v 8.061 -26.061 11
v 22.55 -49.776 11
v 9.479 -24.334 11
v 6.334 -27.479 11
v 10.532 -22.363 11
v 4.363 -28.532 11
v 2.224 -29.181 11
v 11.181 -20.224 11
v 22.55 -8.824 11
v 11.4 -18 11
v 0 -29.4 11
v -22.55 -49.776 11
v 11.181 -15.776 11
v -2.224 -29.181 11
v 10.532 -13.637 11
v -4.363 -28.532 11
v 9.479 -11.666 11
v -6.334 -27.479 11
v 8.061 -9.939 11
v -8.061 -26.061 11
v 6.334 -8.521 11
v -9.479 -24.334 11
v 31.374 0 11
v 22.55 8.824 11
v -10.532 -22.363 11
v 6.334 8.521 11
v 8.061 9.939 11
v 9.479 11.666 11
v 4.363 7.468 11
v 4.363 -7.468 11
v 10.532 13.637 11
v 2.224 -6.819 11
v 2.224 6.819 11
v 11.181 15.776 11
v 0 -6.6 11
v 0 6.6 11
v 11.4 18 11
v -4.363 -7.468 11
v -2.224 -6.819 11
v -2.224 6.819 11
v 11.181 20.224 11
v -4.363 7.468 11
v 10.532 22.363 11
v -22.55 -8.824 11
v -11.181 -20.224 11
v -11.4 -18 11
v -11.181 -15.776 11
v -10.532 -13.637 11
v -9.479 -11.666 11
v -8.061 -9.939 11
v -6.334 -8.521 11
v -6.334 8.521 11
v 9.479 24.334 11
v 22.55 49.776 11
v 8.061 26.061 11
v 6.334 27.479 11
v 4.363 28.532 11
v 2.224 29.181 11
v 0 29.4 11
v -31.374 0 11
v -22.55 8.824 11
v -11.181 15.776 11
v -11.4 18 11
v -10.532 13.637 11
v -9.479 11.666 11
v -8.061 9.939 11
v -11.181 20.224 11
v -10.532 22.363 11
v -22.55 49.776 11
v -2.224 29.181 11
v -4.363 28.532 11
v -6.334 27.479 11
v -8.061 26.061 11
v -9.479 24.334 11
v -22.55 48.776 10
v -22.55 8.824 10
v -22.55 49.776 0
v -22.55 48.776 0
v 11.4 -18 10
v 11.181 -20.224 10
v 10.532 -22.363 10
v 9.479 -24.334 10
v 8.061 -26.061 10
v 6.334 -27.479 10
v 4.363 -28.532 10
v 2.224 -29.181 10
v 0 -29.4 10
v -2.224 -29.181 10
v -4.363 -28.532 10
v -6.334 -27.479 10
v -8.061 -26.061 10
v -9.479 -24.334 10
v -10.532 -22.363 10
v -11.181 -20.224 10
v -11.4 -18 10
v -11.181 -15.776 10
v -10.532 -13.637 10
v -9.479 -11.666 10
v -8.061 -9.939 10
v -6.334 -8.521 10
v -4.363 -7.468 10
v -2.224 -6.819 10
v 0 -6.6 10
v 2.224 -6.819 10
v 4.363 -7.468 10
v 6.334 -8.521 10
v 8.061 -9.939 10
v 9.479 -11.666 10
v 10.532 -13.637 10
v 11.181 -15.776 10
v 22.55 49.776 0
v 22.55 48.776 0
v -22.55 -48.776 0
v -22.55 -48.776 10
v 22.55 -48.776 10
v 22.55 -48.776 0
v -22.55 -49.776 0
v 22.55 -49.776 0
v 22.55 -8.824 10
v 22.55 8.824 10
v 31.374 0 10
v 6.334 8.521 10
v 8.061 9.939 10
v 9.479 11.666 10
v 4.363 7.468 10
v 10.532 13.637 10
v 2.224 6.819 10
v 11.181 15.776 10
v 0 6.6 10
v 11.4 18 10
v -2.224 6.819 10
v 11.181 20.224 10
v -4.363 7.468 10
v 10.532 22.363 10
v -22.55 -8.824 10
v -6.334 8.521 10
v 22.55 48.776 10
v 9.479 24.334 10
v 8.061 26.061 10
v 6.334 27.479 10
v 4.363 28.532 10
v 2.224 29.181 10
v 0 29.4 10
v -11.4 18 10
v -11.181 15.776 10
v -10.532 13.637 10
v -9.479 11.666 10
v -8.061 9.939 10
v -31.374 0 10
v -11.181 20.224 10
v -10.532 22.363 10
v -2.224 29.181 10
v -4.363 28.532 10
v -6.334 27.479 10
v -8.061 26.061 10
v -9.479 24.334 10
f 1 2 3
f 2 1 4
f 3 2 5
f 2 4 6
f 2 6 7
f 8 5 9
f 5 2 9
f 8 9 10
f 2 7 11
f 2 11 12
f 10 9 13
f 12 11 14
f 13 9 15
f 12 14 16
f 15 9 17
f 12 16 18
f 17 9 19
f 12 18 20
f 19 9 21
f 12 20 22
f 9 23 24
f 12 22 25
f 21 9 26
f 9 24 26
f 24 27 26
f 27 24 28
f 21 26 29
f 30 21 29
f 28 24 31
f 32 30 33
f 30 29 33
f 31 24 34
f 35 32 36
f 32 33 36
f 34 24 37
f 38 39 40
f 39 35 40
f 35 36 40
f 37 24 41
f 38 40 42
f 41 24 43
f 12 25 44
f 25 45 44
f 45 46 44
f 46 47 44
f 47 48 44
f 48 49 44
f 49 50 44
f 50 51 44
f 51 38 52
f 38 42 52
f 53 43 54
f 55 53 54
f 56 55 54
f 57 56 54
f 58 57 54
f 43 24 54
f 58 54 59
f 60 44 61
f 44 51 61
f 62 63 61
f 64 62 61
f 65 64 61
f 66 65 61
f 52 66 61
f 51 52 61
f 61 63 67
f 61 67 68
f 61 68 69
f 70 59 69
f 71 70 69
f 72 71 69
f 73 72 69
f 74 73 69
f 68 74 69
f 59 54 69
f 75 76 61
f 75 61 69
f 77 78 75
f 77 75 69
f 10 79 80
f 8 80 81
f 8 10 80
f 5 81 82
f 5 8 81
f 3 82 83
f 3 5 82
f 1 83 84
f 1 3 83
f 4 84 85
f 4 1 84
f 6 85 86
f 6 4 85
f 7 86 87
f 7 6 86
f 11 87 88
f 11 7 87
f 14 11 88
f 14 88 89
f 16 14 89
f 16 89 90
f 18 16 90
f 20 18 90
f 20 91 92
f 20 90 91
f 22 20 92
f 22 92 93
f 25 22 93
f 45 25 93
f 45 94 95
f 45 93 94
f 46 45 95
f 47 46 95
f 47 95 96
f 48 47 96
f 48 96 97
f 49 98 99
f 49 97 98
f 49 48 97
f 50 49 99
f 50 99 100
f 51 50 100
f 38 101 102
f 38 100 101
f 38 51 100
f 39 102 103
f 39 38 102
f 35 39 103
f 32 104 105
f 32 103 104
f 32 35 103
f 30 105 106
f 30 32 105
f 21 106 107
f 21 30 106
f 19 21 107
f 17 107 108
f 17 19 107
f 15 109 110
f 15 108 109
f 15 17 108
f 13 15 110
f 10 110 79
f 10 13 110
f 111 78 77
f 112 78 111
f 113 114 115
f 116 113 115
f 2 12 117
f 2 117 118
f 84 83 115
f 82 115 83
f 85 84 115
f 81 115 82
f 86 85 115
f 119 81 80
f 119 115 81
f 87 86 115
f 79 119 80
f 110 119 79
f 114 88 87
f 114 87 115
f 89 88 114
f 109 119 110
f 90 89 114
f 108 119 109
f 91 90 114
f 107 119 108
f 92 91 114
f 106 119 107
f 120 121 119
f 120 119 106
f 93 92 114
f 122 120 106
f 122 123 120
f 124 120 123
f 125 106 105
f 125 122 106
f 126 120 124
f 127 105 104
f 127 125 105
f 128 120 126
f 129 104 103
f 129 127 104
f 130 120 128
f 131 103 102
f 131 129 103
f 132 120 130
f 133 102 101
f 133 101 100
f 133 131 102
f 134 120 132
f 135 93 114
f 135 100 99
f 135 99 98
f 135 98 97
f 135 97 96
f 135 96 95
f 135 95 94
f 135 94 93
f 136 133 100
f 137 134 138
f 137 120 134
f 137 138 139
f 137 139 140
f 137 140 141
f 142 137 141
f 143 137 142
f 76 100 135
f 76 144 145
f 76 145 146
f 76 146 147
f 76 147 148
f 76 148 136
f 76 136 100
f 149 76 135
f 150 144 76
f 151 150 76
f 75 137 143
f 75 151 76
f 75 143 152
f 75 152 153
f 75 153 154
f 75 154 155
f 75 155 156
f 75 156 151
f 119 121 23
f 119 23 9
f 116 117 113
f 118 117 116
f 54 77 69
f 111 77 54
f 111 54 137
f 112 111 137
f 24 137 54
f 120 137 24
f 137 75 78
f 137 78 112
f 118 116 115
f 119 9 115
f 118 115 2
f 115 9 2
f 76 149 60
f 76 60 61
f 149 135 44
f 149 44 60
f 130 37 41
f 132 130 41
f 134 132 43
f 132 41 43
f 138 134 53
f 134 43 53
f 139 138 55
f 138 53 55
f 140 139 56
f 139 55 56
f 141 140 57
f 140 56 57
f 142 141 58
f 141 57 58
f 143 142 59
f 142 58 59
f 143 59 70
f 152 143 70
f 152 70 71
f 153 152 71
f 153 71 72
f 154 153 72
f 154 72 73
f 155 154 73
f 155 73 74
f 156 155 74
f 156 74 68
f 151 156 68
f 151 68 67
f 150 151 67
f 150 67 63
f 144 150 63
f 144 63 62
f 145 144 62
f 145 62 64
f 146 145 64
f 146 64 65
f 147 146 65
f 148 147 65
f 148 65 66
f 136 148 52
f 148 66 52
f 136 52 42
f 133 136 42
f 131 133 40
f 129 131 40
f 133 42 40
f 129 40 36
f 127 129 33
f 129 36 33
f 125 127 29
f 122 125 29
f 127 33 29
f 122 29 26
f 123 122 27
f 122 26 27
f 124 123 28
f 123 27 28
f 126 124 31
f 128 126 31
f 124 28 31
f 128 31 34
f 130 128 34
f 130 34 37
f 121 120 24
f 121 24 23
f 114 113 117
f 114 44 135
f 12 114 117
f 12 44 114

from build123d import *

# Parameters (mm, degrees)
PAD014_DEPTH    = 1
SKETCH020_W     = 45.1
SKETCH020_H     = 1
PAD015_DEPTH    = 10
SKETCH021_R     = 11.4
POCKET005_DEPTH = 5


with BuildPart() as part:
    # Sketch019 → Pad014 (new body)
    with BuildSketch(Plane.XY):
        Polygon((-22.55, 49.776346), (22.55, 49.776346), (22.55, 8.823654), (31.373654, 0), (22.55, -8.823654), (22.55, -49.776346), (-22.55, -49.776346), (-22.55, -8.823654), (-31.373654, 0), (-22.55, 8.823654), align=None)
    extrude(amount=PAD014_DEPTH)

    # Sketch020 (on Face11 of Pad014) → Pad015 (join)
    with BuildSketch(Plane(origin=(0, 0, 0), x_dir=(1, 0, 0), z_dir=(0, 0, -1))):
        with Locations((0, 49.276346)):
            Rectangle(SKETCH020_W, SKETCH020_H)
        with Locations((0, -49.276346)):
            Rectangle(SKETCH020_W, SKETCH020_H)
    extrude(amount=PAD015_DEPTH)

    # Sketch021 (on Face5 of Pad015) → Pocket005 (cut)
    with BuildSketch(Plane.XY.offset(1)):
        with Locations((0, 18)):
            Circle(SKETCH021_R)
    pocket005 = extrude(amount=-POCKET005_DEPTH, mode=Mode.SUBTRACT)

    # Mirrored002: Pocket005 across Sketch021 H_Axis
    add(pocket005.mirror(Plane(origin=(0, 0, 1), x_dir=(0, 0, 1), z_dir=(0, 1, 0))), mode=Mode.SUBTRACT)


with BuildPart() as part_1:
    # Body034 placement: moved
    add(part.part.moved(Location((0, 0, 10))))


solid = part_1.part
